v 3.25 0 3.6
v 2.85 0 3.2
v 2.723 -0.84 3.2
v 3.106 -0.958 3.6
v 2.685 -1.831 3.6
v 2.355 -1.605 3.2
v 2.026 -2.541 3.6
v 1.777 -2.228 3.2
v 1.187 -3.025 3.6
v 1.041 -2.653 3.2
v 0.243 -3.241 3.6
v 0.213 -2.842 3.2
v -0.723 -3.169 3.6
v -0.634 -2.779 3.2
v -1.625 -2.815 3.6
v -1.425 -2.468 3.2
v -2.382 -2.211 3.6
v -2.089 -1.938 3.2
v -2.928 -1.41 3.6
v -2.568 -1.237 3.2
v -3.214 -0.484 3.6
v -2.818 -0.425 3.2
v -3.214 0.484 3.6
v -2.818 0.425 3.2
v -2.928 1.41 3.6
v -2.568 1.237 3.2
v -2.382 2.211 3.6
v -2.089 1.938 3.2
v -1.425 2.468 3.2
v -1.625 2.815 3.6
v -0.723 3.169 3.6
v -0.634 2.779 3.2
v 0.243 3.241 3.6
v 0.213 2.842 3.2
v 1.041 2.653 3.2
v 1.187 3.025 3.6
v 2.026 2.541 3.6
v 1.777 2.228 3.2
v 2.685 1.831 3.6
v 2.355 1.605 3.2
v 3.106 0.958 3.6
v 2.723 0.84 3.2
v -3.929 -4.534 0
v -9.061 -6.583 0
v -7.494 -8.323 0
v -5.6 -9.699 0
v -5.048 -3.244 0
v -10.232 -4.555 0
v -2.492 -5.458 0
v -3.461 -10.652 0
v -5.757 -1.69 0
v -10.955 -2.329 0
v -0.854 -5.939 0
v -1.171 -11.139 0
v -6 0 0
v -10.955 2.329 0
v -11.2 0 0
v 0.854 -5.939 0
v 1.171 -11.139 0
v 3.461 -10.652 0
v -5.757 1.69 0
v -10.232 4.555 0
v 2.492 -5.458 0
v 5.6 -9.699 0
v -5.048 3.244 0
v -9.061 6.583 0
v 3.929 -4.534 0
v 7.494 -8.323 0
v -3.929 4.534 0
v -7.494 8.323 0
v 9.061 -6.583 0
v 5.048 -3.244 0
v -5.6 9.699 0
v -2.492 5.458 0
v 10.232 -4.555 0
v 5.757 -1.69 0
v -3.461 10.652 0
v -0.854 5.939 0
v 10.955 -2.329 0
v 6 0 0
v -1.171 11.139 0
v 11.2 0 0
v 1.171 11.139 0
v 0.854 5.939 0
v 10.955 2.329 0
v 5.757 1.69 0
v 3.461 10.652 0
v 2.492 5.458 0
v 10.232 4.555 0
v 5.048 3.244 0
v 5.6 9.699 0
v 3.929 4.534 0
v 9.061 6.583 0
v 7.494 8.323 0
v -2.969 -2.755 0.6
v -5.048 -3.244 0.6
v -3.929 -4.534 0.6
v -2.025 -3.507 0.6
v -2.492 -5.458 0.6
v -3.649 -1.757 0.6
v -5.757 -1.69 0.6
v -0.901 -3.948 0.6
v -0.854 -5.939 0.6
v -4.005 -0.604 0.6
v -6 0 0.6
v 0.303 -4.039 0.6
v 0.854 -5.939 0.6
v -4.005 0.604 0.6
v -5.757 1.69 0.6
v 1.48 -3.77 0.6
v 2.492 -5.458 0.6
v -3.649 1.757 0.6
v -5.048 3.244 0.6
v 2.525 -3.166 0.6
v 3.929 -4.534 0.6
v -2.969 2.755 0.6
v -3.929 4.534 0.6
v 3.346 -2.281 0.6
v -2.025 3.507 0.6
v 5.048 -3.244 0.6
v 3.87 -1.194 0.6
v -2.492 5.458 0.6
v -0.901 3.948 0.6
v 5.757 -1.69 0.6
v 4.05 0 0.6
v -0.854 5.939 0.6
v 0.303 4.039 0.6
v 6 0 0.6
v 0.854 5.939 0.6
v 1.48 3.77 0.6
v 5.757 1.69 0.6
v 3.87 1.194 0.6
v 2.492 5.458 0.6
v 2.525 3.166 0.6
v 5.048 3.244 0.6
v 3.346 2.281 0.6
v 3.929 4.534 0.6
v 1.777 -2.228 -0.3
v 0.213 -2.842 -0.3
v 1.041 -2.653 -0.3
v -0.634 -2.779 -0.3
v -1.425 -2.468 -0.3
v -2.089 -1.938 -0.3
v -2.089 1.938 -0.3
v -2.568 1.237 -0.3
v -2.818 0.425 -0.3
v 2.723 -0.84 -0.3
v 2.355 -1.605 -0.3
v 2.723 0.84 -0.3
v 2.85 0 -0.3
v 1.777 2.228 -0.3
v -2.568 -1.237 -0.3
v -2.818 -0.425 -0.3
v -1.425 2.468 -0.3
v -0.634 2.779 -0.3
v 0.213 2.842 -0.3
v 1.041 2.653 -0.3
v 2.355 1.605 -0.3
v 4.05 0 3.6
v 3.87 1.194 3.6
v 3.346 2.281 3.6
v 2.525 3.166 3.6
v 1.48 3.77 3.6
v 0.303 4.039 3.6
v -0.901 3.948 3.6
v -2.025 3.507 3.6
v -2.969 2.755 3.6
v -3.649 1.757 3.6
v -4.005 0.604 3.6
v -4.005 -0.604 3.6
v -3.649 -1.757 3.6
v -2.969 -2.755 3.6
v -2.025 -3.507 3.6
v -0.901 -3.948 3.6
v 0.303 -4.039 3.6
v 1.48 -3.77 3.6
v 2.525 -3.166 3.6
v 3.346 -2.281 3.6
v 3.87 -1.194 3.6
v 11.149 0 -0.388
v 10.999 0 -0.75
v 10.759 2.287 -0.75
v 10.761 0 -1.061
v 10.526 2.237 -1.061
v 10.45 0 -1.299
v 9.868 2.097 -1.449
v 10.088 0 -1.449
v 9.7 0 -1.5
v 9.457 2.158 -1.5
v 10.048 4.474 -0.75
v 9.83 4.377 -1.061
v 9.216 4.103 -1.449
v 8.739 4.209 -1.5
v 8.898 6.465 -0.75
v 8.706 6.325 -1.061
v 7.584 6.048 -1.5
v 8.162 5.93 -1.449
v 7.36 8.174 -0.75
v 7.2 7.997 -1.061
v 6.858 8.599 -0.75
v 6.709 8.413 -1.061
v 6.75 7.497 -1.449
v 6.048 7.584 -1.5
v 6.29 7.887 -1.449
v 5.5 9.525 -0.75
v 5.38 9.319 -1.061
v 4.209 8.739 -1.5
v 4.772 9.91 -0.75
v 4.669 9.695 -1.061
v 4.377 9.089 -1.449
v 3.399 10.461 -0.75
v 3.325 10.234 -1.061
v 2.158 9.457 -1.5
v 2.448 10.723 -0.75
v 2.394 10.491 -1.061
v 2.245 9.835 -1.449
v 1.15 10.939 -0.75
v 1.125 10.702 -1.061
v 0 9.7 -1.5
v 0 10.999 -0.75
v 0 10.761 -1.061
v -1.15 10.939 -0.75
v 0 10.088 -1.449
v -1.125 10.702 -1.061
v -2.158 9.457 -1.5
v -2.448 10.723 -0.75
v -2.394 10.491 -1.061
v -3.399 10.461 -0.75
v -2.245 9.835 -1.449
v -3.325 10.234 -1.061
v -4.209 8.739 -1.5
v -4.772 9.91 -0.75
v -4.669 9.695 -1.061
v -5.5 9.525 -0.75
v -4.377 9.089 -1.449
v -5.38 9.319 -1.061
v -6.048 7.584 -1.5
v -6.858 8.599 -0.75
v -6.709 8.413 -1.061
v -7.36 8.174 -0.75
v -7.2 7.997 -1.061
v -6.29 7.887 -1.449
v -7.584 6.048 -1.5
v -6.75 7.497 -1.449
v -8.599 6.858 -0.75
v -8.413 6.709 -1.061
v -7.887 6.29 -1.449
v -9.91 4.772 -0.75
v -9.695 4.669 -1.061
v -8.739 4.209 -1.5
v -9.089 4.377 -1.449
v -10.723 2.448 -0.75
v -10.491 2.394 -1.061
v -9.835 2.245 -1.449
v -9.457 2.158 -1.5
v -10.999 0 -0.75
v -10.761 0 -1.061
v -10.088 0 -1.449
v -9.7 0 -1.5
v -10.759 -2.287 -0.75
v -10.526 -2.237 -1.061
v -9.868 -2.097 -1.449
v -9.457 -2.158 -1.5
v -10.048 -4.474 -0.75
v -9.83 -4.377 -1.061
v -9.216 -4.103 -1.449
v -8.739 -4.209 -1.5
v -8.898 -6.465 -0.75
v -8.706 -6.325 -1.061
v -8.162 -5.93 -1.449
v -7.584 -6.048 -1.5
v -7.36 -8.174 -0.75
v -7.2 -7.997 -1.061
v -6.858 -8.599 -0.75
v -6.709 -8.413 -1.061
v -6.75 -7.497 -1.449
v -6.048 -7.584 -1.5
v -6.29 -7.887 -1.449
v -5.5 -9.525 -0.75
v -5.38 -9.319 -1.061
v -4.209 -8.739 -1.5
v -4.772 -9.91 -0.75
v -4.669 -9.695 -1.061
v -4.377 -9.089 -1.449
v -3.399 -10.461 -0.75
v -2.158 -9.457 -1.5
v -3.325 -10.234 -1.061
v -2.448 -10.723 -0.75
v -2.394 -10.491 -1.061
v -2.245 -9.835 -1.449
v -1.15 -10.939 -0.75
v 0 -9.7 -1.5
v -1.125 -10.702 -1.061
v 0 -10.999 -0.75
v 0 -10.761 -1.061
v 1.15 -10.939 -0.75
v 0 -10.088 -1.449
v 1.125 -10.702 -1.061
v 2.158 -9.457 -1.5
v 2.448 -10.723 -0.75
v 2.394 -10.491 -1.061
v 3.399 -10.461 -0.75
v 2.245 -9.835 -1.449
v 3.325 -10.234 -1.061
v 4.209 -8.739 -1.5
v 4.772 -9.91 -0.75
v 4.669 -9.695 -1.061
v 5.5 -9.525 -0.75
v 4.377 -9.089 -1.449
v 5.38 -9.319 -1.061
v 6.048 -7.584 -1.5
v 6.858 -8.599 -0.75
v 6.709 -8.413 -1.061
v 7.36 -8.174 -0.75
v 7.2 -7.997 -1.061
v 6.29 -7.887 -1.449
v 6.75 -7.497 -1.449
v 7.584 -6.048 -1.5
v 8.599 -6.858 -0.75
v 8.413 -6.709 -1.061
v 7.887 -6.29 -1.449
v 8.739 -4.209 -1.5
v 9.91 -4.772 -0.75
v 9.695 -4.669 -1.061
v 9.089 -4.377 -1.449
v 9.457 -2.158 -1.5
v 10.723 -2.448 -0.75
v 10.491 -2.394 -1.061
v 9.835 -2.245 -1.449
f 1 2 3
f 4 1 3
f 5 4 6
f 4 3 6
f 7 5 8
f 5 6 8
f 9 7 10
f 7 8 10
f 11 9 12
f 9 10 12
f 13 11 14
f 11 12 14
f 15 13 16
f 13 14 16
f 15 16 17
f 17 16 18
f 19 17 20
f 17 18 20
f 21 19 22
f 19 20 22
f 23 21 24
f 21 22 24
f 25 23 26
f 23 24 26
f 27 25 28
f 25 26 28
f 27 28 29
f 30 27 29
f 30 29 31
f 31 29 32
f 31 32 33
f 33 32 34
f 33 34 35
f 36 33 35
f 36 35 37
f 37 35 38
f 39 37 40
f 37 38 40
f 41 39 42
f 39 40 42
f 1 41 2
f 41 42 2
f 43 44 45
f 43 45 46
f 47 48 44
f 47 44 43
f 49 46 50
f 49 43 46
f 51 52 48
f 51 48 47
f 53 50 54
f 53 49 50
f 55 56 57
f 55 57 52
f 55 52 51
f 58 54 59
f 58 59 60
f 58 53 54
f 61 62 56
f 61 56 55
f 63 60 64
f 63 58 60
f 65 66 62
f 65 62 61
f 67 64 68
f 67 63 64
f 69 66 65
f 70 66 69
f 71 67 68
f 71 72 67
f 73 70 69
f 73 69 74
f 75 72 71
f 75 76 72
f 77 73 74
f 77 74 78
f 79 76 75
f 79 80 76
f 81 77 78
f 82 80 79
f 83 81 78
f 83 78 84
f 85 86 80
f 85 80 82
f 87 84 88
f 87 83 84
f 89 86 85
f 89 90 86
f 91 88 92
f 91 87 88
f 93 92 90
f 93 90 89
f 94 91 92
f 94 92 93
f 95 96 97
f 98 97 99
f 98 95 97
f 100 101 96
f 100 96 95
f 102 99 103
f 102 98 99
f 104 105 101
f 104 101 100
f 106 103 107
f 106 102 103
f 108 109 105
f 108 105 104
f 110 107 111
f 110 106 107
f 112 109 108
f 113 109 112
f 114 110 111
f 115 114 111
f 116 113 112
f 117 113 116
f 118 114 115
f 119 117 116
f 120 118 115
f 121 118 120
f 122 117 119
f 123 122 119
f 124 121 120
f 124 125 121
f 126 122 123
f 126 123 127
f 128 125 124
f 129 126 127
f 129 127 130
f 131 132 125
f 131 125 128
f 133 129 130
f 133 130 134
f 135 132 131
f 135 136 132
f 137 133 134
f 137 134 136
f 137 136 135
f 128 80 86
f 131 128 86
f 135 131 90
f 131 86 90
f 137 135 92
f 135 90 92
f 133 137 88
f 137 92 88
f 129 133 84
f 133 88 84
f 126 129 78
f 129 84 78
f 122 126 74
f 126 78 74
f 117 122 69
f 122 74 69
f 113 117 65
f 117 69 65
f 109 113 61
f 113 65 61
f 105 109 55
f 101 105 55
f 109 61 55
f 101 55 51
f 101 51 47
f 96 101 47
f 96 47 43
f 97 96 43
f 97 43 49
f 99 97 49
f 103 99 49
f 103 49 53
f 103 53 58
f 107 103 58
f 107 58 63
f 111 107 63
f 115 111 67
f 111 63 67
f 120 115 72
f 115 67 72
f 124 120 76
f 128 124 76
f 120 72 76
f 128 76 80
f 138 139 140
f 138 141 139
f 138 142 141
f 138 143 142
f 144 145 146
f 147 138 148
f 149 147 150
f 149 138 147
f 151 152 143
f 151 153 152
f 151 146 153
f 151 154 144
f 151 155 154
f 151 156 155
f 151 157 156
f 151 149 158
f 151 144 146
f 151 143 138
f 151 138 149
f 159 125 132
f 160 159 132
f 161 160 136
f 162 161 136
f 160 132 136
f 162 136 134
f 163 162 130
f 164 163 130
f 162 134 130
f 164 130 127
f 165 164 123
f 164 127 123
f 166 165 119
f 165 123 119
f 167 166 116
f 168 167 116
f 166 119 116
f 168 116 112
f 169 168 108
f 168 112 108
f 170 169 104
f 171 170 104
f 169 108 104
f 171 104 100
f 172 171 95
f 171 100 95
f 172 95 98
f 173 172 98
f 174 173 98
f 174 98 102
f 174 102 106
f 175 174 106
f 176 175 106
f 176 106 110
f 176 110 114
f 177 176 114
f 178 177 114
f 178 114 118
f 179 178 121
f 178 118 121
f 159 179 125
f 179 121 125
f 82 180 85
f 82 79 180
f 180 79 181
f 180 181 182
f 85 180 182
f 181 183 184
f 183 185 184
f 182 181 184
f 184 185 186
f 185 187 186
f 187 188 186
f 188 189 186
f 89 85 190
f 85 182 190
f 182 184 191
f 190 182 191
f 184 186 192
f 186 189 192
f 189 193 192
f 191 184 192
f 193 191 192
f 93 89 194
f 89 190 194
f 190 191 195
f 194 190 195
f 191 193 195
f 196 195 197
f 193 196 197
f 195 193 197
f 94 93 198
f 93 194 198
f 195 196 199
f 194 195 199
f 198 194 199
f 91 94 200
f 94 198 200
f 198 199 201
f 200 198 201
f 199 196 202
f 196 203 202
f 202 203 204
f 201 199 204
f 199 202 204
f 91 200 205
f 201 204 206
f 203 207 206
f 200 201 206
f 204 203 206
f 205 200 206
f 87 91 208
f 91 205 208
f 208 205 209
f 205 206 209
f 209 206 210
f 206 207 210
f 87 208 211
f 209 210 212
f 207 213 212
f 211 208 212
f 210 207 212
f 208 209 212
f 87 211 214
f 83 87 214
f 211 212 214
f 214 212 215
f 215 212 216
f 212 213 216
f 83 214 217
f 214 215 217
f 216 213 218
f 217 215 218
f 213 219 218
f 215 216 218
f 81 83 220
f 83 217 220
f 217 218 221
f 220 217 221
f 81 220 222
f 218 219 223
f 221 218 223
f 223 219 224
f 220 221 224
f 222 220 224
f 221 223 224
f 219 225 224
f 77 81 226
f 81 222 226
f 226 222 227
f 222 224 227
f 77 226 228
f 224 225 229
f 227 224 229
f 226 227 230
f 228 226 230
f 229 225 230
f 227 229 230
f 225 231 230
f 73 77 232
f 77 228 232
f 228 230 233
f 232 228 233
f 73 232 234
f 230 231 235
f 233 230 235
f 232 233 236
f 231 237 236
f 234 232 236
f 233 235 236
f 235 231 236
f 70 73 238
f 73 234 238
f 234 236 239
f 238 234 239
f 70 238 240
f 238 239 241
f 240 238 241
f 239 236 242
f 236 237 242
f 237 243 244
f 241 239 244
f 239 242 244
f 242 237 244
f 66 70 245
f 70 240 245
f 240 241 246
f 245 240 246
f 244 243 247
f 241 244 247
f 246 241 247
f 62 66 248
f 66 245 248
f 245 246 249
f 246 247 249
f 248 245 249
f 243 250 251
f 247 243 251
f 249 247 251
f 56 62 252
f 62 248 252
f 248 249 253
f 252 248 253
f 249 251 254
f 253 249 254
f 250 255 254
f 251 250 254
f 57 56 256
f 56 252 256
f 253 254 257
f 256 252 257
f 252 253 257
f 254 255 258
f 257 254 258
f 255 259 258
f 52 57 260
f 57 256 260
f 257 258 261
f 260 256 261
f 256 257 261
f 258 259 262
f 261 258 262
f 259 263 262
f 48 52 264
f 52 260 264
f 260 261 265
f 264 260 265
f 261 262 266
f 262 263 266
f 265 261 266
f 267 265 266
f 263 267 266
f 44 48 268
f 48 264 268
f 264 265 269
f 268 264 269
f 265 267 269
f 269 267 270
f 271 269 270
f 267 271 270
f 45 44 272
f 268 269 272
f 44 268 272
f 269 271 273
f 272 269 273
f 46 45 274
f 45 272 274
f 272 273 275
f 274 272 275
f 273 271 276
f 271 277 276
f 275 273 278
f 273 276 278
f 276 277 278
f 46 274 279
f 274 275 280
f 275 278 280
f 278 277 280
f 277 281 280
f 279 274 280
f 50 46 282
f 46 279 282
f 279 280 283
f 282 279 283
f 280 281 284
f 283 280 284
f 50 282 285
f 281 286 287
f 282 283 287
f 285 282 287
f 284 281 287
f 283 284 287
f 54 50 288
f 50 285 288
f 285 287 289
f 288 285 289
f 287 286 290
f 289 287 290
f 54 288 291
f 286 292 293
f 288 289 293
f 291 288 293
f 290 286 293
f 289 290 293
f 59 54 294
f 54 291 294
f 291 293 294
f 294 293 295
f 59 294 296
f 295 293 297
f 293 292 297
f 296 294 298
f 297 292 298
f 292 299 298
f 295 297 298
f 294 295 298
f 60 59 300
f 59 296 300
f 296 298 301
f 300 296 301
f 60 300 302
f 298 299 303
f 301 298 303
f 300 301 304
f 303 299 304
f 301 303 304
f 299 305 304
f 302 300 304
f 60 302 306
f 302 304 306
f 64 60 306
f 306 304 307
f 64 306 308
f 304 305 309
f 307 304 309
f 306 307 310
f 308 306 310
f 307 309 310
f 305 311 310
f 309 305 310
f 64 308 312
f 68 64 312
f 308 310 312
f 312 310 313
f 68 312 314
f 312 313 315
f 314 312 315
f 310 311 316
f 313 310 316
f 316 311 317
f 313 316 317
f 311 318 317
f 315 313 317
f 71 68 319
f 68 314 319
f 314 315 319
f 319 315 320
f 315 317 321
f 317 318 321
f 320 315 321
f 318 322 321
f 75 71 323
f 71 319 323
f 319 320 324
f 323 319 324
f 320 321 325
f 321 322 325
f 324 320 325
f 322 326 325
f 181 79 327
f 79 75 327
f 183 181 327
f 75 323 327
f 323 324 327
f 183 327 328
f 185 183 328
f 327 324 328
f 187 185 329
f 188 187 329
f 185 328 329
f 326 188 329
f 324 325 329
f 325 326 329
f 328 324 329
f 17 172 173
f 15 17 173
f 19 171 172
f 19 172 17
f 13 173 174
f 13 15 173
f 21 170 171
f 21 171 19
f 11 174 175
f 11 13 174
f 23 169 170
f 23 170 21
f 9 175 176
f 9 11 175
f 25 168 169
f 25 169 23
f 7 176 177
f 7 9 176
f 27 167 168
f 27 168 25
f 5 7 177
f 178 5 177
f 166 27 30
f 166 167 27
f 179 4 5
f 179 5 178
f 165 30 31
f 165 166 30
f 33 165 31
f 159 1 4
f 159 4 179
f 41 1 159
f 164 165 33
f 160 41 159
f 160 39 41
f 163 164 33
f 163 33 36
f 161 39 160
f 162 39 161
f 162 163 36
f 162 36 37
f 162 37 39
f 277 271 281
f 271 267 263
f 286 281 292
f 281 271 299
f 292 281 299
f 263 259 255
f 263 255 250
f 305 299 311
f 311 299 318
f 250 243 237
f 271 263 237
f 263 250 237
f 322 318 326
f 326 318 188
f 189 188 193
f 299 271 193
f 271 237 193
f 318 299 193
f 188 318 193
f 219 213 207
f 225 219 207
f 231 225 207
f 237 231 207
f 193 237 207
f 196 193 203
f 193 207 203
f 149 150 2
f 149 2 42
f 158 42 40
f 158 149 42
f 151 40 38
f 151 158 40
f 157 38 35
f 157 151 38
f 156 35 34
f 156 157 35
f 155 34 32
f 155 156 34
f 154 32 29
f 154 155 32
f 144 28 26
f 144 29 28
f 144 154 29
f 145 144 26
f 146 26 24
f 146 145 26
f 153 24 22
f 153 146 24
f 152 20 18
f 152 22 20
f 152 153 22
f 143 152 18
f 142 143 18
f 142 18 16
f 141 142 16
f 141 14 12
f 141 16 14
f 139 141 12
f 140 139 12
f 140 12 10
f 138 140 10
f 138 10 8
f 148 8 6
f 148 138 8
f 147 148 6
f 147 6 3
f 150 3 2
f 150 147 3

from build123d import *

# Parameters (mm, degrees)
F0_R     = 11.2
F1_DEPTH = 1.5
F2_R     = 6
F3_DEPTH = 0.6
F4_R     = 4.05
F5_DEPTH = 3
F6_T     = -1.2
F7_R     = 1.49999
F8_SIZE  = 0.4


# Not quite as in the source:
# - a fillet or chamfer is up to 0.001 mm smaller than in the source, because OpenCascade refuses the exact size


with BuildPart() as f1:
    # F0 (on Top) → F1 (new body)
    with BuildSketch(Plane.XY):
        Circle(F0_R)
    extrude(amount=-F1_DEPTH)

    # F2 (on face) → F3 (join)
    with BuildSketch(Plane.XY):
        Circle(F2_R)
    extrude(amount=F3_DEPTH)

    # F4 (on face) → F5 (join)
    with BuildSketch(Plane.XY.offset(0.6)):
        Circle(F4_R)
    extrude(amount=F5_DEPTH)

    # F6
    f6_openings = [f1.faces().sort_by_distance(p)[0] for p in [
        (0, 0, 3.6),
    ]]
    offset(amount=F6_T, openings=f6_openings, kind=Kind.INTERSECTION)

    # F7 (radius 1.5 in the source; OpenCascade refuses exactly that, so slightly less here)
    f7_edges = [f1.edges().sort_by_distance(p)[0] for p in [
        (-11.2, 0, -1.5),
    ]]
    fillet(f7_edges, radius=F7_R)

    # F8
    f8_edges = [f1.edges().sort_by_distance(p)[0] for p in [
        (-2.85, 0, 3.6),
        (2.85, 0, 1.65),
    ]]
    chamfer(f8_edges, length=F8_SIZE)


solid = f1.part
